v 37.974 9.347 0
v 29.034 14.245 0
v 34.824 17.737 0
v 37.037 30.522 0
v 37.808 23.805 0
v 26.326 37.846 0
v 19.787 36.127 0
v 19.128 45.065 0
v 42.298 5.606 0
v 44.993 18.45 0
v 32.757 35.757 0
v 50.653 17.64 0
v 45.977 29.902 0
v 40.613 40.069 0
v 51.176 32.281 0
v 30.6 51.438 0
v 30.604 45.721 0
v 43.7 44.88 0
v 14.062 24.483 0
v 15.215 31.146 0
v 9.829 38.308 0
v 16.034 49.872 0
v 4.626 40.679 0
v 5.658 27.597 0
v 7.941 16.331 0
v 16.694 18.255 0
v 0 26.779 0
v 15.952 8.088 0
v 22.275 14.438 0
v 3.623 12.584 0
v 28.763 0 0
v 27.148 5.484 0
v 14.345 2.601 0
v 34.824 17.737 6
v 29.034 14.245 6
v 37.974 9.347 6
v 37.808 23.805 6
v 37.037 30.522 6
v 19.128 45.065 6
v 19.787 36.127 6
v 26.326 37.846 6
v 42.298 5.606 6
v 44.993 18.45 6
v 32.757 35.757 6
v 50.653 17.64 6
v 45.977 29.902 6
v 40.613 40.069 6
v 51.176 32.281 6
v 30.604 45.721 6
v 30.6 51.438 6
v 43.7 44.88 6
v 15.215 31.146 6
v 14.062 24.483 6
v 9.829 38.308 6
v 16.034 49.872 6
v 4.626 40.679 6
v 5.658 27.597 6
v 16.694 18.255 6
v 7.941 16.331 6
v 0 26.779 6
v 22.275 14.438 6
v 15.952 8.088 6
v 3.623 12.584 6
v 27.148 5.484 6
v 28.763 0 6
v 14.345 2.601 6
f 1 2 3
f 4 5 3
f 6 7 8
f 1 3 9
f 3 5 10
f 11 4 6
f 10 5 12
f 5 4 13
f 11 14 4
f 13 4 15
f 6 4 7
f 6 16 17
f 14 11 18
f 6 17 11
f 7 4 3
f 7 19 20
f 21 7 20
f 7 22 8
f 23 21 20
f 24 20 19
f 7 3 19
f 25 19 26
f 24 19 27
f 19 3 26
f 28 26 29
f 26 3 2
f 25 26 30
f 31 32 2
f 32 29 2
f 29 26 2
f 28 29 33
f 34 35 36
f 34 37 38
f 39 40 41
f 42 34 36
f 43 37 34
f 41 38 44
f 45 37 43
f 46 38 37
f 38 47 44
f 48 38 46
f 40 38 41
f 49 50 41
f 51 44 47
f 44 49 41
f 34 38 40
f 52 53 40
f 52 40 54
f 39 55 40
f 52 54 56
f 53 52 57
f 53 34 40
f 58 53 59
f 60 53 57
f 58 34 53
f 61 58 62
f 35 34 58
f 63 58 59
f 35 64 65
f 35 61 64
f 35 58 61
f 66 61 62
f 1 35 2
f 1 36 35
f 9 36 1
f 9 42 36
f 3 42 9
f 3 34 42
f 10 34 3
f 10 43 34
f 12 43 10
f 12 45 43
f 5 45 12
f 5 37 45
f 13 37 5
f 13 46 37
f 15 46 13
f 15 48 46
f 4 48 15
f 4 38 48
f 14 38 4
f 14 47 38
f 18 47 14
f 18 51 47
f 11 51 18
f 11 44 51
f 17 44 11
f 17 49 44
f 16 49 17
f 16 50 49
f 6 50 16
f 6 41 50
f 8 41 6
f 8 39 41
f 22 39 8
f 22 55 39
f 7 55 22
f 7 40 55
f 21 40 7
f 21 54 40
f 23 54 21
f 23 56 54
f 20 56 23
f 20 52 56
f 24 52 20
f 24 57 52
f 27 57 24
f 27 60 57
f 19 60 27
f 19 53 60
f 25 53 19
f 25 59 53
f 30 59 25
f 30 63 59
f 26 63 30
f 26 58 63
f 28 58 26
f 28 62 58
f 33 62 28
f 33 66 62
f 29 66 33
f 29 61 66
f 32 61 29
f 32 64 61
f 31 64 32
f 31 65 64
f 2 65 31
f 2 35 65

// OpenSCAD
$fn = 32;

// ----------------------------------------------------------------------
// Fan rotor section: 11 blades, 12 mm hub radius, 14 mm blades
// ----------------------------------------------------------------------

// --- parameters (mm) ---
profile_height = 6;       // extrusion height
profile_points = 33;      // points of the closed outline

profile = [[37.808, 23.805], [45.977, 29.902], [51.176, 32.281], [37.037, 30.522], [40.613, 40.069], [43.7, 44.88], [32.757, 35.757], [30.604, 45.721], [30.6, 51.438], [26.326, 37.846], [19.128, 45.065], [16.034, 49.872], [19.787, 36.127], [9.829, 38.308], [4.626, 40.679], [15.215, 31.146], [5.658, 27.597], [0, 26.779], [14.062, 24.483], [7.941, 16.331], [3.623, 12.584], [16.694, 18.255], [15.952, 8.088], [14.345, 2.601], [22.275, 14.438], [27.148, 5.484], [28.763, 0], [29.034, 14.245], [37.974, 9.347], [42.298, 5.606], [34.824, 17.737], [44.993, 18.45], [50.653, 17.64]];  // single closed polygon, 33 points, counter clockwise

// --- the one profile operation ---
linear_extrude(height = profile_height) polygon(points = profile);
